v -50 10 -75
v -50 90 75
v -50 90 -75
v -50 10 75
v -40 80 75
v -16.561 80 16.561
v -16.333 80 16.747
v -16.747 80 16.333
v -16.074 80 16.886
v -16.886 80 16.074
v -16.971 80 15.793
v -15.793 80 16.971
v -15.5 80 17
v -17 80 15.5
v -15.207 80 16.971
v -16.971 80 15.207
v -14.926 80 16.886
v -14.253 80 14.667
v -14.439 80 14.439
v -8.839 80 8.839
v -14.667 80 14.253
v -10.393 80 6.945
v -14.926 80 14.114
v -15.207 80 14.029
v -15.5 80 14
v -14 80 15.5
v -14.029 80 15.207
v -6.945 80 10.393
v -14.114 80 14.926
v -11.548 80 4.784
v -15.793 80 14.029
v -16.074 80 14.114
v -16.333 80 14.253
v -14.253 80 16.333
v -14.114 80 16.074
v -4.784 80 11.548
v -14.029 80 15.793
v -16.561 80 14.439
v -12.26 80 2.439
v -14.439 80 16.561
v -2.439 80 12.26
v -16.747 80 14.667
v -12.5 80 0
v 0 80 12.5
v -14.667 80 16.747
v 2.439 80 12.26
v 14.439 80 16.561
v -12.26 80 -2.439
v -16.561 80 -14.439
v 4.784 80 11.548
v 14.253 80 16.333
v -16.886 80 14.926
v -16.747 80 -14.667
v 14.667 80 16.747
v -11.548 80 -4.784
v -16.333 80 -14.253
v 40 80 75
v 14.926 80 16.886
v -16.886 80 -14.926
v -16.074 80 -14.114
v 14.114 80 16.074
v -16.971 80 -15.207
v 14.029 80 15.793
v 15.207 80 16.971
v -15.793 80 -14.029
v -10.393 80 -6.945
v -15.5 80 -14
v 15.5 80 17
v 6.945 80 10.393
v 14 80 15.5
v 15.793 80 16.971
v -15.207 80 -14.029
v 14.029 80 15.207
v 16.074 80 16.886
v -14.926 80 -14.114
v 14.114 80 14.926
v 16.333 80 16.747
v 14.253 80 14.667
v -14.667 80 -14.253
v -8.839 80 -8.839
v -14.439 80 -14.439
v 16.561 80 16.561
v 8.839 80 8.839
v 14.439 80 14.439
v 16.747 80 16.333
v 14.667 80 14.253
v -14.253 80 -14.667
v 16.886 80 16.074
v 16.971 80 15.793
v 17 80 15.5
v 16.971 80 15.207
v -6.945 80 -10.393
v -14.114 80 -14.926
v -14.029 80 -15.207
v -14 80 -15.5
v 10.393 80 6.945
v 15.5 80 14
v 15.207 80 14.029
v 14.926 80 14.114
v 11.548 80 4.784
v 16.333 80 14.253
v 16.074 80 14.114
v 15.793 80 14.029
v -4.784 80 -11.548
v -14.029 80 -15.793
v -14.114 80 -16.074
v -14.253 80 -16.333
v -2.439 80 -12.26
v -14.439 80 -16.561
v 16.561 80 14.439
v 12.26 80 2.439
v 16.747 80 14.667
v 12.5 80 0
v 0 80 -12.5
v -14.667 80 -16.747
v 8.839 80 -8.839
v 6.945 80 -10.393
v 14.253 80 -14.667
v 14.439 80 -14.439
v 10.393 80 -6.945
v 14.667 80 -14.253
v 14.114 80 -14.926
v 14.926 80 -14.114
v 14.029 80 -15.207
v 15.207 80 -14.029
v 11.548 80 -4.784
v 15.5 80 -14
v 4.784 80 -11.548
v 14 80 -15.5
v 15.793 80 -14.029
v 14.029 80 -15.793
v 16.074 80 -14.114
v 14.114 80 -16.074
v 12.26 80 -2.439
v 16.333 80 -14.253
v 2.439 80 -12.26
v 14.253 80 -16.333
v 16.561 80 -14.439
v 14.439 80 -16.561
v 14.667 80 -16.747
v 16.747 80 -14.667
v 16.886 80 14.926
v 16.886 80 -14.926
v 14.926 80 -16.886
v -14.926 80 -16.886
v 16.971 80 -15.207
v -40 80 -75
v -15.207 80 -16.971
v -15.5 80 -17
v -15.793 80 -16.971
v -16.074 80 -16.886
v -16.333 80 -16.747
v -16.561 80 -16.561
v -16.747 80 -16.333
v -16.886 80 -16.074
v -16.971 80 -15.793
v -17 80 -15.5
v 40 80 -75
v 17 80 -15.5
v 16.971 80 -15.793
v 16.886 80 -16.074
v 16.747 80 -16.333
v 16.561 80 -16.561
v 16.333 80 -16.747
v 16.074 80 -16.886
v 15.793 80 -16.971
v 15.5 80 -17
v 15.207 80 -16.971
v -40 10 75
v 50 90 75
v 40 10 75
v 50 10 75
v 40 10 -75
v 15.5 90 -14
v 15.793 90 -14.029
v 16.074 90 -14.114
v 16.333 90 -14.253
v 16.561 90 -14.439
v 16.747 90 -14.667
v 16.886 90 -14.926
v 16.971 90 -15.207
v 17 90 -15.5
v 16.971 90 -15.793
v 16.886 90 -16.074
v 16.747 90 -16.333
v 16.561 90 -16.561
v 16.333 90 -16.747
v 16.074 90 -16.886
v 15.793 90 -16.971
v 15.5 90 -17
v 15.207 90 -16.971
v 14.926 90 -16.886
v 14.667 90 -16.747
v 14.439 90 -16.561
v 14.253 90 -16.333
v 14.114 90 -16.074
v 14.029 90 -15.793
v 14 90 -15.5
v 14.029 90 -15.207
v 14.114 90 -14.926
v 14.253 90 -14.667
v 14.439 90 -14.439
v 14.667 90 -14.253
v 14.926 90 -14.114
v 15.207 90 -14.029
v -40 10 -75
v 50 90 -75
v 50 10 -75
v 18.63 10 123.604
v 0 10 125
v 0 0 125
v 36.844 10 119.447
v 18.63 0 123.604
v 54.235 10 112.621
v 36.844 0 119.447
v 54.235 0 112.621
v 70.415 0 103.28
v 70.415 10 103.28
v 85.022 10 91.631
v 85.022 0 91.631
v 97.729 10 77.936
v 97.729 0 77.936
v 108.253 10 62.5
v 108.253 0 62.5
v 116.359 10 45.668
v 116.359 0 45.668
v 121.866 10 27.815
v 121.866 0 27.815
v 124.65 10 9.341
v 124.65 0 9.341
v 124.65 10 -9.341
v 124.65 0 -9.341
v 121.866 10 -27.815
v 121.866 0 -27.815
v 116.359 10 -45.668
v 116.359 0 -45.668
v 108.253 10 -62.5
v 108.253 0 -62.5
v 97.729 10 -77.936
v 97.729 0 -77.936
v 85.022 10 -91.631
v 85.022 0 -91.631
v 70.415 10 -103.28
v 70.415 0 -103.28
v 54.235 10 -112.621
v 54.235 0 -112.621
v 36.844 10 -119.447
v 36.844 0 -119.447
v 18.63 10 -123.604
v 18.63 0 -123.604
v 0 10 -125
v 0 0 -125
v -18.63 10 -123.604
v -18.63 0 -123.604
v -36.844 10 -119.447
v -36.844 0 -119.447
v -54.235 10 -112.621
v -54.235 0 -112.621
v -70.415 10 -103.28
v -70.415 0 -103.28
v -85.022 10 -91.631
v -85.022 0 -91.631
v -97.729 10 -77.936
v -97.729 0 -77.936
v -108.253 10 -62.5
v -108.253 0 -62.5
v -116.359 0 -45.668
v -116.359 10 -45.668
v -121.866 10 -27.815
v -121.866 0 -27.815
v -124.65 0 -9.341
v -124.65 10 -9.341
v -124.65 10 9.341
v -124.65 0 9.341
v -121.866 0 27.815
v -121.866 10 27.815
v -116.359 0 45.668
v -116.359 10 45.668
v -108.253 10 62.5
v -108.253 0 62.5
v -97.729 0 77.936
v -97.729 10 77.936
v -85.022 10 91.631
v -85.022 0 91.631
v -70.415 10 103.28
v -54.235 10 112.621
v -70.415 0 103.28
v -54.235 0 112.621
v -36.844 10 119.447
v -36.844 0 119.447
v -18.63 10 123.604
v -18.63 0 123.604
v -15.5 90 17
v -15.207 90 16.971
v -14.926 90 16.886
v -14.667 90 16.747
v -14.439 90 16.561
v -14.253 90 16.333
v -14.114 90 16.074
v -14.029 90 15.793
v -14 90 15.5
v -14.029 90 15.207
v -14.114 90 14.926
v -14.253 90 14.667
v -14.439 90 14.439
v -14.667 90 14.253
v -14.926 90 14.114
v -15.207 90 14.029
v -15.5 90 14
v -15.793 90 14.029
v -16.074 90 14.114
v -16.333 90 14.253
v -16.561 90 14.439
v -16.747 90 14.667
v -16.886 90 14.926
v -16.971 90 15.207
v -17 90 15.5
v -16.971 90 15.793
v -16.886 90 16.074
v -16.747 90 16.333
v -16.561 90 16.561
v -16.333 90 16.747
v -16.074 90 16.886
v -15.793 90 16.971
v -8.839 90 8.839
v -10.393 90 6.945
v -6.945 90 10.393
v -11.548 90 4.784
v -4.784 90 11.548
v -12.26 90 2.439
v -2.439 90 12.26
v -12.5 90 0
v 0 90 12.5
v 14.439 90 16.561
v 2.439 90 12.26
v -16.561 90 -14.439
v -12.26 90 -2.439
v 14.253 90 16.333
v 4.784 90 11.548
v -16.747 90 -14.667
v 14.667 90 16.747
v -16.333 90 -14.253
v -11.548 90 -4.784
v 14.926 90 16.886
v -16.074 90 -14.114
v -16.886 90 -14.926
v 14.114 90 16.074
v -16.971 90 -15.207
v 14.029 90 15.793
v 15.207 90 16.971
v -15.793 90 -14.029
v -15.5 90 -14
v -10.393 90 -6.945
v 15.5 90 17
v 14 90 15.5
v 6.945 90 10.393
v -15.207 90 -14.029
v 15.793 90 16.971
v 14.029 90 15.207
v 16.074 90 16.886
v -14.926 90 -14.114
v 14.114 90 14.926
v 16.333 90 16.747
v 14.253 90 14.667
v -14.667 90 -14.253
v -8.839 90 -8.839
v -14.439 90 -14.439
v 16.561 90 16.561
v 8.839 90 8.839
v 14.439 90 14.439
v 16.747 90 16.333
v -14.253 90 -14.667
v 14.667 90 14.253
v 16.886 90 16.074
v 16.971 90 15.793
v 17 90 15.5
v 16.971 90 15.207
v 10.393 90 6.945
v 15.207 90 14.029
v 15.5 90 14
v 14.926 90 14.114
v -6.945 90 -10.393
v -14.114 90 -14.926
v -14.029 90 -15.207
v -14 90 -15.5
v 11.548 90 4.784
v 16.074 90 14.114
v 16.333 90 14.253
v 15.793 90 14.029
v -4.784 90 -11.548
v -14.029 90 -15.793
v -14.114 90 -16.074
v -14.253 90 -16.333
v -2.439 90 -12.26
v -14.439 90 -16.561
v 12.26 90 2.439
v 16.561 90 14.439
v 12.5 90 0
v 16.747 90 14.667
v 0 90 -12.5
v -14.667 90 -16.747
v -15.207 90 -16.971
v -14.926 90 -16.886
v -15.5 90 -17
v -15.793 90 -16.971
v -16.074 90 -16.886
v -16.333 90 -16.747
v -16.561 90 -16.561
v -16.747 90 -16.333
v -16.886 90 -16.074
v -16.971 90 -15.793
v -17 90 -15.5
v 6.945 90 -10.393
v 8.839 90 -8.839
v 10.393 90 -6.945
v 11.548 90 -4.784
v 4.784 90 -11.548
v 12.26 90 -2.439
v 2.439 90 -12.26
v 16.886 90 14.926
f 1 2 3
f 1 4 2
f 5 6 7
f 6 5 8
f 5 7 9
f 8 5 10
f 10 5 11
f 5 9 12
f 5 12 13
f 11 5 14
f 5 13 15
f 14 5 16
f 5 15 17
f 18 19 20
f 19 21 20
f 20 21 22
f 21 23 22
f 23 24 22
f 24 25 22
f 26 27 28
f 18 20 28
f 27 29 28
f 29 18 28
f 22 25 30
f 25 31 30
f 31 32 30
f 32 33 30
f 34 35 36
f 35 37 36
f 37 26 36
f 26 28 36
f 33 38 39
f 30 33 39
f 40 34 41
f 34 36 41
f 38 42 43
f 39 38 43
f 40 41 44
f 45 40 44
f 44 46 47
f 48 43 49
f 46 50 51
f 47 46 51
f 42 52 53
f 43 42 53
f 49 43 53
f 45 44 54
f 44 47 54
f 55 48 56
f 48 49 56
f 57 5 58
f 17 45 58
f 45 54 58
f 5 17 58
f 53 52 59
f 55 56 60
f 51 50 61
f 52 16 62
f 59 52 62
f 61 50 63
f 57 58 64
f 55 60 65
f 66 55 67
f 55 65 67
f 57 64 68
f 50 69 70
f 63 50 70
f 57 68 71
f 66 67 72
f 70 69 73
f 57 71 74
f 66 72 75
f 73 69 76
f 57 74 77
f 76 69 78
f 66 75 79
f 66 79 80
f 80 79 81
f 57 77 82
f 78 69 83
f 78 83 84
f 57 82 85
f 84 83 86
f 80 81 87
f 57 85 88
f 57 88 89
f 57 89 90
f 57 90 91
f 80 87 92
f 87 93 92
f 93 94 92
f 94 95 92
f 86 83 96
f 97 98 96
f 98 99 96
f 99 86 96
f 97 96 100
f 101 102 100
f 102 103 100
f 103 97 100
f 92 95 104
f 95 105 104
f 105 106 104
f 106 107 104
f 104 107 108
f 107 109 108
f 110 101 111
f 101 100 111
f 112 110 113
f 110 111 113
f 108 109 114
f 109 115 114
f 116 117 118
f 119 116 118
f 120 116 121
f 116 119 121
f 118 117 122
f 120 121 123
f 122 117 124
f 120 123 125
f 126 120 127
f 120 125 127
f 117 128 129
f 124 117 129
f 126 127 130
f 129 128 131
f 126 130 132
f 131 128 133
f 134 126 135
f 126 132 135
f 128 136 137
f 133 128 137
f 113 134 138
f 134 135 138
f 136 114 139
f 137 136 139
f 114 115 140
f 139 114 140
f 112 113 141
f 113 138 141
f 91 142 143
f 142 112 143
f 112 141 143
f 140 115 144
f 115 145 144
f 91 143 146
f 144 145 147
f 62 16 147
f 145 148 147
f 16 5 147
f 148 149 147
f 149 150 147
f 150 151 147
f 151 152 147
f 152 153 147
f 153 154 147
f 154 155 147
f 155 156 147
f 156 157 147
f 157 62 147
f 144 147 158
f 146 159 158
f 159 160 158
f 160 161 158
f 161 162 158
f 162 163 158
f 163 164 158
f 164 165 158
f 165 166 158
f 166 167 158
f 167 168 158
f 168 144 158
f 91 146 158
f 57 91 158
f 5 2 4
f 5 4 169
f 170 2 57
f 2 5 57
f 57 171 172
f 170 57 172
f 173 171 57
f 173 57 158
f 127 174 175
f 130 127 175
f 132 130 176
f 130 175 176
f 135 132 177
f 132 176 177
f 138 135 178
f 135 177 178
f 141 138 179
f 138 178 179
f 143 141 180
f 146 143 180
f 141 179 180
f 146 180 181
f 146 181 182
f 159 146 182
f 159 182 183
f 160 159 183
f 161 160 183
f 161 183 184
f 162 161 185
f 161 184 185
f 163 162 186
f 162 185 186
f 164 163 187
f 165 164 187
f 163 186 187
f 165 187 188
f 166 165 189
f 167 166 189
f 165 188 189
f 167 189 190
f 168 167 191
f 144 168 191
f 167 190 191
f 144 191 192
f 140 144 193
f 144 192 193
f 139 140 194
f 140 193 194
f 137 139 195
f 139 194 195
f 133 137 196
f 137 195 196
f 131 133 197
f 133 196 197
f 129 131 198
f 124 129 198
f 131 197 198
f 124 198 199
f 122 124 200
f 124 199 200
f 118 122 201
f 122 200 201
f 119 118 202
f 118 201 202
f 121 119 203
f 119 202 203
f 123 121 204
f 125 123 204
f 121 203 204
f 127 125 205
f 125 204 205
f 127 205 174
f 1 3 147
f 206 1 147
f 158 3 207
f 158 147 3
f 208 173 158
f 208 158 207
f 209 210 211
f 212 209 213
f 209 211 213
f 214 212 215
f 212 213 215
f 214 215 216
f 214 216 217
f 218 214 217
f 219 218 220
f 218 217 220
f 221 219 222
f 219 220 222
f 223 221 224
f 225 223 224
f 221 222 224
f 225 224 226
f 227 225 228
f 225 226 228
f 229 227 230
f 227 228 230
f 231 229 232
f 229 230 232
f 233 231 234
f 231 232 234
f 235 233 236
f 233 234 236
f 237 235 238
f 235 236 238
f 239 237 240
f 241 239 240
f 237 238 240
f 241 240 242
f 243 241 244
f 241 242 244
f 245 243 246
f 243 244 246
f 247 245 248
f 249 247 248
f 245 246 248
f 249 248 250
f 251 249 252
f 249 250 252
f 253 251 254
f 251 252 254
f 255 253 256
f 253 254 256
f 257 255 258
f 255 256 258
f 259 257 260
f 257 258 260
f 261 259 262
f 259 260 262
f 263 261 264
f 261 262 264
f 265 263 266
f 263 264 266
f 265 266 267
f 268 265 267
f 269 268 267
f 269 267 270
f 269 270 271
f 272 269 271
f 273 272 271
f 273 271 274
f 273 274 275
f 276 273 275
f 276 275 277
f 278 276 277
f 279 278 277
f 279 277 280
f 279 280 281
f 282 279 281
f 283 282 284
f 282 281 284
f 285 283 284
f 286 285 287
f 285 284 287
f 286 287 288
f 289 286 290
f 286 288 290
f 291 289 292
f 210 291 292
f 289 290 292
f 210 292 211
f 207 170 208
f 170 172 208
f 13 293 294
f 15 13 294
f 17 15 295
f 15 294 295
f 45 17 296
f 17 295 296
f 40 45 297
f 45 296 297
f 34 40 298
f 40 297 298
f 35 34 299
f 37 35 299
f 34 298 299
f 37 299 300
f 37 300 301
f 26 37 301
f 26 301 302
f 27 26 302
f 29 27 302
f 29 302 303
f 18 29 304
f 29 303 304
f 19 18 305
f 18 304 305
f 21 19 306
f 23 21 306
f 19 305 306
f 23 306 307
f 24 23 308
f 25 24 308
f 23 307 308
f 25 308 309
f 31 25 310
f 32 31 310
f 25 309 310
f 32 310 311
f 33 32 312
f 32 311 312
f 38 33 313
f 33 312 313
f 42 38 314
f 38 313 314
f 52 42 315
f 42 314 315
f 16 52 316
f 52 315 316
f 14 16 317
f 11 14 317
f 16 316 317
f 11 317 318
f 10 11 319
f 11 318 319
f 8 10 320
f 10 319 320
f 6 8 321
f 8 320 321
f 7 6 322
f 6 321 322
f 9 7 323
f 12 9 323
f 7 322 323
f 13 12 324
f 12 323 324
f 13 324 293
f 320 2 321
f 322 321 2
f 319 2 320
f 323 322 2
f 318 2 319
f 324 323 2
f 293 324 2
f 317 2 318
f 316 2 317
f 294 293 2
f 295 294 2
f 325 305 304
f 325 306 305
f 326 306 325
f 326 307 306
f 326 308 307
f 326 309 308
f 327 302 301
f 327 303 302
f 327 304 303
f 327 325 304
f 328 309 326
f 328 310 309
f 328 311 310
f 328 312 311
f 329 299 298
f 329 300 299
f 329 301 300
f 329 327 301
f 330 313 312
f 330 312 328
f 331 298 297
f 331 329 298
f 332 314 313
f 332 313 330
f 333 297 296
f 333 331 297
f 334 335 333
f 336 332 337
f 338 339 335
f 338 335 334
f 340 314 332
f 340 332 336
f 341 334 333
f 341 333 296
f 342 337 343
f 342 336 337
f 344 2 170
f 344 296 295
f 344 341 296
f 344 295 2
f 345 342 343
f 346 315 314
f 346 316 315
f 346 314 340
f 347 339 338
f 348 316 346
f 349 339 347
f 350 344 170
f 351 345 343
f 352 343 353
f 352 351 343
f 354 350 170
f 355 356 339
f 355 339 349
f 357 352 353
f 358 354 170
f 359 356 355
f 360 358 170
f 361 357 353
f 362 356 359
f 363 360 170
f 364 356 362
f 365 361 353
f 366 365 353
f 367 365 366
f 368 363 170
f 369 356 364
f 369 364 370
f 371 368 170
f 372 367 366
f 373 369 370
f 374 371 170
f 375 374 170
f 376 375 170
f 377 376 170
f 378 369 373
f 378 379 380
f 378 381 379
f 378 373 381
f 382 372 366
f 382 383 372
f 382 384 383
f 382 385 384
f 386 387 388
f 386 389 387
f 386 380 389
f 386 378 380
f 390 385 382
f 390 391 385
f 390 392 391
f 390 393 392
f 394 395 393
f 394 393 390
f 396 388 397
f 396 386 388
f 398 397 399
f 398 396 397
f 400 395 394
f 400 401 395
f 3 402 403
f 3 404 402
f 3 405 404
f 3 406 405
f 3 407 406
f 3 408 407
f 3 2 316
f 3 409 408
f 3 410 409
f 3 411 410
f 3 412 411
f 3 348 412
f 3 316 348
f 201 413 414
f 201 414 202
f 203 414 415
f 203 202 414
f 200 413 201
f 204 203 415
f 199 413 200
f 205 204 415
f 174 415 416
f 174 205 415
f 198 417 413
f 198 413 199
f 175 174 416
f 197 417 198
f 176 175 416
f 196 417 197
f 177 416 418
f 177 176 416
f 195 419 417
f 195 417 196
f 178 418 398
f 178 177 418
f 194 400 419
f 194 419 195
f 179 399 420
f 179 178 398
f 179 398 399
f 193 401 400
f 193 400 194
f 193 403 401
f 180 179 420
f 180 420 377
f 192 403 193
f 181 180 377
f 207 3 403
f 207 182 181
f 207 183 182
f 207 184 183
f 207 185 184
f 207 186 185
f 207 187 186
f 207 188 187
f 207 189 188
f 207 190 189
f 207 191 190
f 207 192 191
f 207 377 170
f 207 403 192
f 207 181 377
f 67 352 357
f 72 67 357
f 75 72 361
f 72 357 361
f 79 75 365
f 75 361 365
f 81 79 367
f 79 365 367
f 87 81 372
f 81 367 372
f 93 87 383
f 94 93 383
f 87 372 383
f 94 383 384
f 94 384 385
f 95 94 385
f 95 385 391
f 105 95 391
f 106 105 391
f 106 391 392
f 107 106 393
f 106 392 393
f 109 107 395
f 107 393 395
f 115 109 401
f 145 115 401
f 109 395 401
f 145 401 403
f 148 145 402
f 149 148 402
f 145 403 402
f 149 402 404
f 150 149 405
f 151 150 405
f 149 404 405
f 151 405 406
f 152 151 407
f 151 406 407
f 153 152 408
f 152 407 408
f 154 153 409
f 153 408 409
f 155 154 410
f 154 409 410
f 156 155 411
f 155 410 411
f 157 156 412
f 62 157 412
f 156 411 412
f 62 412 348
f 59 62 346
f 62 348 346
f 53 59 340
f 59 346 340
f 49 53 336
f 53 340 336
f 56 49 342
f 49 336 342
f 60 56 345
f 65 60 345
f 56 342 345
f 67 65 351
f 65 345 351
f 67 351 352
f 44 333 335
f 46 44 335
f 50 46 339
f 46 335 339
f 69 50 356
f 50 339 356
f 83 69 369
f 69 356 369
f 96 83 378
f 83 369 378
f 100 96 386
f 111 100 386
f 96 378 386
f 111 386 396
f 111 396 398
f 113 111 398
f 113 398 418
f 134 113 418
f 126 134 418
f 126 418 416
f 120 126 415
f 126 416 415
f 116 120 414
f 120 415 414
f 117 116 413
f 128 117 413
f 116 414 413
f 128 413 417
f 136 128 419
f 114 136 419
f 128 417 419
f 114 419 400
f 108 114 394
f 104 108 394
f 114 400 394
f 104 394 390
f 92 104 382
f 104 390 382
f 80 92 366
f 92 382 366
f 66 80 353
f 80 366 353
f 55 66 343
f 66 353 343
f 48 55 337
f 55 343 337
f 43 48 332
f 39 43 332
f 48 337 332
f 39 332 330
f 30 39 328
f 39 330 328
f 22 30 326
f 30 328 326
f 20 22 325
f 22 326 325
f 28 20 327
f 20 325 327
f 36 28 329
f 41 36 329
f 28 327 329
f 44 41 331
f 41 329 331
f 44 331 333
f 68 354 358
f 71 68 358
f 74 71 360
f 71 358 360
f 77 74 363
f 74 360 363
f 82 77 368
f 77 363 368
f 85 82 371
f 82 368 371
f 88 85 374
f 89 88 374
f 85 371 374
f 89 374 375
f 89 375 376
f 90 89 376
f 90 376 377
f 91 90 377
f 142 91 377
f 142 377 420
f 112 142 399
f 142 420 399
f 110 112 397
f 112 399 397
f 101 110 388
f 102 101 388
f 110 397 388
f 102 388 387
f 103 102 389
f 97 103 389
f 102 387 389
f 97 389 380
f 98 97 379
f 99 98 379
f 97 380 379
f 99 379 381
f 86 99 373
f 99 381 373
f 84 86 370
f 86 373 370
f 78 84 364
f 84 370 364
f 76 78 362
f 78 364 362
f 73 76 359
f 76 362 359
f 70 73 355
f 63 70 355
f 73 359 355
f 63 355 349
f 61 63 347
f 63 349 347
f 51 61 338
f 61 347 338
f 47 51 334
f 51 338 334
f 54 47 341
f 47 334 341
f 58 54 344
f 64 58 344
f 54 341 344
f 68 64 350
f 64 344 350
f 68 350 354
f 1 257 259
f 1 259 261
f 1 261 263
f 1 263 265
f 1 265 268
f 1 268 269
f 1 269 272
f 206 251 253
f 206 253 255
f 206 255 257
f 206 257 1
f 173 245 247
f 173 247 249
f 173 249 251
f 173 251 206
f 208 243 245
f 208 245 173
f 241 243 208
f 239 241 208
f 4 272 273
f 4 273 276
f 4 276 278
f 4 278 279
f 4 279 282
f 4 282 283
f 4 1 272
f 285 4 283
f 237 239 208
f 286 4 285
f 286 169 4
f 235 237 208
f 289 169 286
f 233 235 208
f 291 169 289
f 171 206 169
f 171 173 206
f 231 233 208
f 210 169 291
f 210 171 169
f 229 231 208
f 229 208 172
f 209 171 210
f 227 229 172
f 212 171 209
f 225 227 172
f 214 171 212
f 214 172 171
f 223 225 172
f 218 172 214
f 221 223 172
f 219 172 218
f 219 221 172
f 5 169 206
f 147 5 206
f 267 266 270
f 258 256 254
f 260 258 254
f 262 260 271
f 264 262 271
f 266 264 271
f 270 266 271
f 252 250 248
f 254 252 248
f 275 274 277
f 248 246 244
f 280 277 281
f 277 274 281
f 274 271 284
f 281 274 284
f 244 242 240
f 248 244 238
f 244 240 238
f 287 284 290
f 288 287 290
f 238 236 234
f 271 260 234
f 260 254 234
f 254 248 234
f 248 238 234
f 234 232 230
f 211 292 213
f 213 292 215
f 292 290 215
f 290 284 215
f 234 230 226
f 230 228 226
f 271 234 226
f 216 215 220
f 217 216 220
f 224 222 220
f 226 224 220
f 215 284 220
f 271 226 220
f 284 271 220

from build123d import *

# Parameters (mm, degrees)
SKETCH1_R           = 125
BOSS_EXTRUDE1_DEPTH = 10
SKETCH2_W           = 10
SKETCH2_H           = 150
BOSS_EXTRUDE2_DEPTH = 70
SKETCH3_W           = 100
SKETCH3_H           = 150
BOSS_EXTRUDE3_DEPTH = 10
SKETCH4_R           = 1.5
SKETCH4_R_2         = 12.5
CUT_EXTRUDE1_DEPTH  = 10


with BuildPart() as part:
    # Sketch1 → Boss-Extrude1 (new body)
    with BuildSketch(Plane(origin=(0, 0, 0), x_dir=(1, 0, 0), z_dir=(0, 1, 0))):
        with Locations(Location((0, 0, 0), (0, 0, 270))):
            Circle(SKETCH1_R)
    extrude(amount=BOSS_EXTRUDE1_DEPTH)

    # Sketch2 → Boss-Extrude2 (add)
    with BuildSketch(Plane(origin=(0, 10, 0), x_dir=(1, 0, 0), z_dir=(0, 1, 0))):
        with Locations((-45, 0)):
            Rectangle(SKETCH2_W, SKETCH2_H)
        with Locations((45, 0)):
            Rectangle(SKETCH2_W, SKETCH2_H)
    extrude(amount=BOSS_EXTRUDE2_DEPTH)

    # Sketch3 → Boss-Extrude3 (add)
    with BuildSketch(Plane(origin=(0, 80, 0), x_dir=(1, 0, 0), z_dir=(0, 1, 0))):
        Rectangle(SKETCH3_W, SKETCH3_H)
    extrude(amount=BOSS_EXTRUDE3_DEPTH)

    # Sketch4 → Cut-Extrude1 (cut)
    with BuildSketch(Plane(origin=(0, 90, 0), x_dir=(1, 0, 0), z_dir=(0, 1, 0))):
        with Locations(Location((-15.5, 15.5, 0), (0, 0, 270))):
            Circle(SKETCH4_R)
        with Locations(Location((15.5, 15.5, 0), (0, 0, 270))):
            Circle(SKETCH4_R)
        with Locations(Location((-15.5, -15.5, 0), (0, 0, 270))):
            Circle(SKETCH4_R)
        with Locations(Location((15.5, -15.5, 0), (0, 0, 270))):
            Circle(SKETCH4_R)
        with Locations(Location((0, 0, 0), (0, 0, 270))):
            Circle(SKETCH4_R_2)
    extrude(amount=-CUT_EXTRUDE1_DEPTH, mode=Mode.SUBTRACT)


solid = part.part
